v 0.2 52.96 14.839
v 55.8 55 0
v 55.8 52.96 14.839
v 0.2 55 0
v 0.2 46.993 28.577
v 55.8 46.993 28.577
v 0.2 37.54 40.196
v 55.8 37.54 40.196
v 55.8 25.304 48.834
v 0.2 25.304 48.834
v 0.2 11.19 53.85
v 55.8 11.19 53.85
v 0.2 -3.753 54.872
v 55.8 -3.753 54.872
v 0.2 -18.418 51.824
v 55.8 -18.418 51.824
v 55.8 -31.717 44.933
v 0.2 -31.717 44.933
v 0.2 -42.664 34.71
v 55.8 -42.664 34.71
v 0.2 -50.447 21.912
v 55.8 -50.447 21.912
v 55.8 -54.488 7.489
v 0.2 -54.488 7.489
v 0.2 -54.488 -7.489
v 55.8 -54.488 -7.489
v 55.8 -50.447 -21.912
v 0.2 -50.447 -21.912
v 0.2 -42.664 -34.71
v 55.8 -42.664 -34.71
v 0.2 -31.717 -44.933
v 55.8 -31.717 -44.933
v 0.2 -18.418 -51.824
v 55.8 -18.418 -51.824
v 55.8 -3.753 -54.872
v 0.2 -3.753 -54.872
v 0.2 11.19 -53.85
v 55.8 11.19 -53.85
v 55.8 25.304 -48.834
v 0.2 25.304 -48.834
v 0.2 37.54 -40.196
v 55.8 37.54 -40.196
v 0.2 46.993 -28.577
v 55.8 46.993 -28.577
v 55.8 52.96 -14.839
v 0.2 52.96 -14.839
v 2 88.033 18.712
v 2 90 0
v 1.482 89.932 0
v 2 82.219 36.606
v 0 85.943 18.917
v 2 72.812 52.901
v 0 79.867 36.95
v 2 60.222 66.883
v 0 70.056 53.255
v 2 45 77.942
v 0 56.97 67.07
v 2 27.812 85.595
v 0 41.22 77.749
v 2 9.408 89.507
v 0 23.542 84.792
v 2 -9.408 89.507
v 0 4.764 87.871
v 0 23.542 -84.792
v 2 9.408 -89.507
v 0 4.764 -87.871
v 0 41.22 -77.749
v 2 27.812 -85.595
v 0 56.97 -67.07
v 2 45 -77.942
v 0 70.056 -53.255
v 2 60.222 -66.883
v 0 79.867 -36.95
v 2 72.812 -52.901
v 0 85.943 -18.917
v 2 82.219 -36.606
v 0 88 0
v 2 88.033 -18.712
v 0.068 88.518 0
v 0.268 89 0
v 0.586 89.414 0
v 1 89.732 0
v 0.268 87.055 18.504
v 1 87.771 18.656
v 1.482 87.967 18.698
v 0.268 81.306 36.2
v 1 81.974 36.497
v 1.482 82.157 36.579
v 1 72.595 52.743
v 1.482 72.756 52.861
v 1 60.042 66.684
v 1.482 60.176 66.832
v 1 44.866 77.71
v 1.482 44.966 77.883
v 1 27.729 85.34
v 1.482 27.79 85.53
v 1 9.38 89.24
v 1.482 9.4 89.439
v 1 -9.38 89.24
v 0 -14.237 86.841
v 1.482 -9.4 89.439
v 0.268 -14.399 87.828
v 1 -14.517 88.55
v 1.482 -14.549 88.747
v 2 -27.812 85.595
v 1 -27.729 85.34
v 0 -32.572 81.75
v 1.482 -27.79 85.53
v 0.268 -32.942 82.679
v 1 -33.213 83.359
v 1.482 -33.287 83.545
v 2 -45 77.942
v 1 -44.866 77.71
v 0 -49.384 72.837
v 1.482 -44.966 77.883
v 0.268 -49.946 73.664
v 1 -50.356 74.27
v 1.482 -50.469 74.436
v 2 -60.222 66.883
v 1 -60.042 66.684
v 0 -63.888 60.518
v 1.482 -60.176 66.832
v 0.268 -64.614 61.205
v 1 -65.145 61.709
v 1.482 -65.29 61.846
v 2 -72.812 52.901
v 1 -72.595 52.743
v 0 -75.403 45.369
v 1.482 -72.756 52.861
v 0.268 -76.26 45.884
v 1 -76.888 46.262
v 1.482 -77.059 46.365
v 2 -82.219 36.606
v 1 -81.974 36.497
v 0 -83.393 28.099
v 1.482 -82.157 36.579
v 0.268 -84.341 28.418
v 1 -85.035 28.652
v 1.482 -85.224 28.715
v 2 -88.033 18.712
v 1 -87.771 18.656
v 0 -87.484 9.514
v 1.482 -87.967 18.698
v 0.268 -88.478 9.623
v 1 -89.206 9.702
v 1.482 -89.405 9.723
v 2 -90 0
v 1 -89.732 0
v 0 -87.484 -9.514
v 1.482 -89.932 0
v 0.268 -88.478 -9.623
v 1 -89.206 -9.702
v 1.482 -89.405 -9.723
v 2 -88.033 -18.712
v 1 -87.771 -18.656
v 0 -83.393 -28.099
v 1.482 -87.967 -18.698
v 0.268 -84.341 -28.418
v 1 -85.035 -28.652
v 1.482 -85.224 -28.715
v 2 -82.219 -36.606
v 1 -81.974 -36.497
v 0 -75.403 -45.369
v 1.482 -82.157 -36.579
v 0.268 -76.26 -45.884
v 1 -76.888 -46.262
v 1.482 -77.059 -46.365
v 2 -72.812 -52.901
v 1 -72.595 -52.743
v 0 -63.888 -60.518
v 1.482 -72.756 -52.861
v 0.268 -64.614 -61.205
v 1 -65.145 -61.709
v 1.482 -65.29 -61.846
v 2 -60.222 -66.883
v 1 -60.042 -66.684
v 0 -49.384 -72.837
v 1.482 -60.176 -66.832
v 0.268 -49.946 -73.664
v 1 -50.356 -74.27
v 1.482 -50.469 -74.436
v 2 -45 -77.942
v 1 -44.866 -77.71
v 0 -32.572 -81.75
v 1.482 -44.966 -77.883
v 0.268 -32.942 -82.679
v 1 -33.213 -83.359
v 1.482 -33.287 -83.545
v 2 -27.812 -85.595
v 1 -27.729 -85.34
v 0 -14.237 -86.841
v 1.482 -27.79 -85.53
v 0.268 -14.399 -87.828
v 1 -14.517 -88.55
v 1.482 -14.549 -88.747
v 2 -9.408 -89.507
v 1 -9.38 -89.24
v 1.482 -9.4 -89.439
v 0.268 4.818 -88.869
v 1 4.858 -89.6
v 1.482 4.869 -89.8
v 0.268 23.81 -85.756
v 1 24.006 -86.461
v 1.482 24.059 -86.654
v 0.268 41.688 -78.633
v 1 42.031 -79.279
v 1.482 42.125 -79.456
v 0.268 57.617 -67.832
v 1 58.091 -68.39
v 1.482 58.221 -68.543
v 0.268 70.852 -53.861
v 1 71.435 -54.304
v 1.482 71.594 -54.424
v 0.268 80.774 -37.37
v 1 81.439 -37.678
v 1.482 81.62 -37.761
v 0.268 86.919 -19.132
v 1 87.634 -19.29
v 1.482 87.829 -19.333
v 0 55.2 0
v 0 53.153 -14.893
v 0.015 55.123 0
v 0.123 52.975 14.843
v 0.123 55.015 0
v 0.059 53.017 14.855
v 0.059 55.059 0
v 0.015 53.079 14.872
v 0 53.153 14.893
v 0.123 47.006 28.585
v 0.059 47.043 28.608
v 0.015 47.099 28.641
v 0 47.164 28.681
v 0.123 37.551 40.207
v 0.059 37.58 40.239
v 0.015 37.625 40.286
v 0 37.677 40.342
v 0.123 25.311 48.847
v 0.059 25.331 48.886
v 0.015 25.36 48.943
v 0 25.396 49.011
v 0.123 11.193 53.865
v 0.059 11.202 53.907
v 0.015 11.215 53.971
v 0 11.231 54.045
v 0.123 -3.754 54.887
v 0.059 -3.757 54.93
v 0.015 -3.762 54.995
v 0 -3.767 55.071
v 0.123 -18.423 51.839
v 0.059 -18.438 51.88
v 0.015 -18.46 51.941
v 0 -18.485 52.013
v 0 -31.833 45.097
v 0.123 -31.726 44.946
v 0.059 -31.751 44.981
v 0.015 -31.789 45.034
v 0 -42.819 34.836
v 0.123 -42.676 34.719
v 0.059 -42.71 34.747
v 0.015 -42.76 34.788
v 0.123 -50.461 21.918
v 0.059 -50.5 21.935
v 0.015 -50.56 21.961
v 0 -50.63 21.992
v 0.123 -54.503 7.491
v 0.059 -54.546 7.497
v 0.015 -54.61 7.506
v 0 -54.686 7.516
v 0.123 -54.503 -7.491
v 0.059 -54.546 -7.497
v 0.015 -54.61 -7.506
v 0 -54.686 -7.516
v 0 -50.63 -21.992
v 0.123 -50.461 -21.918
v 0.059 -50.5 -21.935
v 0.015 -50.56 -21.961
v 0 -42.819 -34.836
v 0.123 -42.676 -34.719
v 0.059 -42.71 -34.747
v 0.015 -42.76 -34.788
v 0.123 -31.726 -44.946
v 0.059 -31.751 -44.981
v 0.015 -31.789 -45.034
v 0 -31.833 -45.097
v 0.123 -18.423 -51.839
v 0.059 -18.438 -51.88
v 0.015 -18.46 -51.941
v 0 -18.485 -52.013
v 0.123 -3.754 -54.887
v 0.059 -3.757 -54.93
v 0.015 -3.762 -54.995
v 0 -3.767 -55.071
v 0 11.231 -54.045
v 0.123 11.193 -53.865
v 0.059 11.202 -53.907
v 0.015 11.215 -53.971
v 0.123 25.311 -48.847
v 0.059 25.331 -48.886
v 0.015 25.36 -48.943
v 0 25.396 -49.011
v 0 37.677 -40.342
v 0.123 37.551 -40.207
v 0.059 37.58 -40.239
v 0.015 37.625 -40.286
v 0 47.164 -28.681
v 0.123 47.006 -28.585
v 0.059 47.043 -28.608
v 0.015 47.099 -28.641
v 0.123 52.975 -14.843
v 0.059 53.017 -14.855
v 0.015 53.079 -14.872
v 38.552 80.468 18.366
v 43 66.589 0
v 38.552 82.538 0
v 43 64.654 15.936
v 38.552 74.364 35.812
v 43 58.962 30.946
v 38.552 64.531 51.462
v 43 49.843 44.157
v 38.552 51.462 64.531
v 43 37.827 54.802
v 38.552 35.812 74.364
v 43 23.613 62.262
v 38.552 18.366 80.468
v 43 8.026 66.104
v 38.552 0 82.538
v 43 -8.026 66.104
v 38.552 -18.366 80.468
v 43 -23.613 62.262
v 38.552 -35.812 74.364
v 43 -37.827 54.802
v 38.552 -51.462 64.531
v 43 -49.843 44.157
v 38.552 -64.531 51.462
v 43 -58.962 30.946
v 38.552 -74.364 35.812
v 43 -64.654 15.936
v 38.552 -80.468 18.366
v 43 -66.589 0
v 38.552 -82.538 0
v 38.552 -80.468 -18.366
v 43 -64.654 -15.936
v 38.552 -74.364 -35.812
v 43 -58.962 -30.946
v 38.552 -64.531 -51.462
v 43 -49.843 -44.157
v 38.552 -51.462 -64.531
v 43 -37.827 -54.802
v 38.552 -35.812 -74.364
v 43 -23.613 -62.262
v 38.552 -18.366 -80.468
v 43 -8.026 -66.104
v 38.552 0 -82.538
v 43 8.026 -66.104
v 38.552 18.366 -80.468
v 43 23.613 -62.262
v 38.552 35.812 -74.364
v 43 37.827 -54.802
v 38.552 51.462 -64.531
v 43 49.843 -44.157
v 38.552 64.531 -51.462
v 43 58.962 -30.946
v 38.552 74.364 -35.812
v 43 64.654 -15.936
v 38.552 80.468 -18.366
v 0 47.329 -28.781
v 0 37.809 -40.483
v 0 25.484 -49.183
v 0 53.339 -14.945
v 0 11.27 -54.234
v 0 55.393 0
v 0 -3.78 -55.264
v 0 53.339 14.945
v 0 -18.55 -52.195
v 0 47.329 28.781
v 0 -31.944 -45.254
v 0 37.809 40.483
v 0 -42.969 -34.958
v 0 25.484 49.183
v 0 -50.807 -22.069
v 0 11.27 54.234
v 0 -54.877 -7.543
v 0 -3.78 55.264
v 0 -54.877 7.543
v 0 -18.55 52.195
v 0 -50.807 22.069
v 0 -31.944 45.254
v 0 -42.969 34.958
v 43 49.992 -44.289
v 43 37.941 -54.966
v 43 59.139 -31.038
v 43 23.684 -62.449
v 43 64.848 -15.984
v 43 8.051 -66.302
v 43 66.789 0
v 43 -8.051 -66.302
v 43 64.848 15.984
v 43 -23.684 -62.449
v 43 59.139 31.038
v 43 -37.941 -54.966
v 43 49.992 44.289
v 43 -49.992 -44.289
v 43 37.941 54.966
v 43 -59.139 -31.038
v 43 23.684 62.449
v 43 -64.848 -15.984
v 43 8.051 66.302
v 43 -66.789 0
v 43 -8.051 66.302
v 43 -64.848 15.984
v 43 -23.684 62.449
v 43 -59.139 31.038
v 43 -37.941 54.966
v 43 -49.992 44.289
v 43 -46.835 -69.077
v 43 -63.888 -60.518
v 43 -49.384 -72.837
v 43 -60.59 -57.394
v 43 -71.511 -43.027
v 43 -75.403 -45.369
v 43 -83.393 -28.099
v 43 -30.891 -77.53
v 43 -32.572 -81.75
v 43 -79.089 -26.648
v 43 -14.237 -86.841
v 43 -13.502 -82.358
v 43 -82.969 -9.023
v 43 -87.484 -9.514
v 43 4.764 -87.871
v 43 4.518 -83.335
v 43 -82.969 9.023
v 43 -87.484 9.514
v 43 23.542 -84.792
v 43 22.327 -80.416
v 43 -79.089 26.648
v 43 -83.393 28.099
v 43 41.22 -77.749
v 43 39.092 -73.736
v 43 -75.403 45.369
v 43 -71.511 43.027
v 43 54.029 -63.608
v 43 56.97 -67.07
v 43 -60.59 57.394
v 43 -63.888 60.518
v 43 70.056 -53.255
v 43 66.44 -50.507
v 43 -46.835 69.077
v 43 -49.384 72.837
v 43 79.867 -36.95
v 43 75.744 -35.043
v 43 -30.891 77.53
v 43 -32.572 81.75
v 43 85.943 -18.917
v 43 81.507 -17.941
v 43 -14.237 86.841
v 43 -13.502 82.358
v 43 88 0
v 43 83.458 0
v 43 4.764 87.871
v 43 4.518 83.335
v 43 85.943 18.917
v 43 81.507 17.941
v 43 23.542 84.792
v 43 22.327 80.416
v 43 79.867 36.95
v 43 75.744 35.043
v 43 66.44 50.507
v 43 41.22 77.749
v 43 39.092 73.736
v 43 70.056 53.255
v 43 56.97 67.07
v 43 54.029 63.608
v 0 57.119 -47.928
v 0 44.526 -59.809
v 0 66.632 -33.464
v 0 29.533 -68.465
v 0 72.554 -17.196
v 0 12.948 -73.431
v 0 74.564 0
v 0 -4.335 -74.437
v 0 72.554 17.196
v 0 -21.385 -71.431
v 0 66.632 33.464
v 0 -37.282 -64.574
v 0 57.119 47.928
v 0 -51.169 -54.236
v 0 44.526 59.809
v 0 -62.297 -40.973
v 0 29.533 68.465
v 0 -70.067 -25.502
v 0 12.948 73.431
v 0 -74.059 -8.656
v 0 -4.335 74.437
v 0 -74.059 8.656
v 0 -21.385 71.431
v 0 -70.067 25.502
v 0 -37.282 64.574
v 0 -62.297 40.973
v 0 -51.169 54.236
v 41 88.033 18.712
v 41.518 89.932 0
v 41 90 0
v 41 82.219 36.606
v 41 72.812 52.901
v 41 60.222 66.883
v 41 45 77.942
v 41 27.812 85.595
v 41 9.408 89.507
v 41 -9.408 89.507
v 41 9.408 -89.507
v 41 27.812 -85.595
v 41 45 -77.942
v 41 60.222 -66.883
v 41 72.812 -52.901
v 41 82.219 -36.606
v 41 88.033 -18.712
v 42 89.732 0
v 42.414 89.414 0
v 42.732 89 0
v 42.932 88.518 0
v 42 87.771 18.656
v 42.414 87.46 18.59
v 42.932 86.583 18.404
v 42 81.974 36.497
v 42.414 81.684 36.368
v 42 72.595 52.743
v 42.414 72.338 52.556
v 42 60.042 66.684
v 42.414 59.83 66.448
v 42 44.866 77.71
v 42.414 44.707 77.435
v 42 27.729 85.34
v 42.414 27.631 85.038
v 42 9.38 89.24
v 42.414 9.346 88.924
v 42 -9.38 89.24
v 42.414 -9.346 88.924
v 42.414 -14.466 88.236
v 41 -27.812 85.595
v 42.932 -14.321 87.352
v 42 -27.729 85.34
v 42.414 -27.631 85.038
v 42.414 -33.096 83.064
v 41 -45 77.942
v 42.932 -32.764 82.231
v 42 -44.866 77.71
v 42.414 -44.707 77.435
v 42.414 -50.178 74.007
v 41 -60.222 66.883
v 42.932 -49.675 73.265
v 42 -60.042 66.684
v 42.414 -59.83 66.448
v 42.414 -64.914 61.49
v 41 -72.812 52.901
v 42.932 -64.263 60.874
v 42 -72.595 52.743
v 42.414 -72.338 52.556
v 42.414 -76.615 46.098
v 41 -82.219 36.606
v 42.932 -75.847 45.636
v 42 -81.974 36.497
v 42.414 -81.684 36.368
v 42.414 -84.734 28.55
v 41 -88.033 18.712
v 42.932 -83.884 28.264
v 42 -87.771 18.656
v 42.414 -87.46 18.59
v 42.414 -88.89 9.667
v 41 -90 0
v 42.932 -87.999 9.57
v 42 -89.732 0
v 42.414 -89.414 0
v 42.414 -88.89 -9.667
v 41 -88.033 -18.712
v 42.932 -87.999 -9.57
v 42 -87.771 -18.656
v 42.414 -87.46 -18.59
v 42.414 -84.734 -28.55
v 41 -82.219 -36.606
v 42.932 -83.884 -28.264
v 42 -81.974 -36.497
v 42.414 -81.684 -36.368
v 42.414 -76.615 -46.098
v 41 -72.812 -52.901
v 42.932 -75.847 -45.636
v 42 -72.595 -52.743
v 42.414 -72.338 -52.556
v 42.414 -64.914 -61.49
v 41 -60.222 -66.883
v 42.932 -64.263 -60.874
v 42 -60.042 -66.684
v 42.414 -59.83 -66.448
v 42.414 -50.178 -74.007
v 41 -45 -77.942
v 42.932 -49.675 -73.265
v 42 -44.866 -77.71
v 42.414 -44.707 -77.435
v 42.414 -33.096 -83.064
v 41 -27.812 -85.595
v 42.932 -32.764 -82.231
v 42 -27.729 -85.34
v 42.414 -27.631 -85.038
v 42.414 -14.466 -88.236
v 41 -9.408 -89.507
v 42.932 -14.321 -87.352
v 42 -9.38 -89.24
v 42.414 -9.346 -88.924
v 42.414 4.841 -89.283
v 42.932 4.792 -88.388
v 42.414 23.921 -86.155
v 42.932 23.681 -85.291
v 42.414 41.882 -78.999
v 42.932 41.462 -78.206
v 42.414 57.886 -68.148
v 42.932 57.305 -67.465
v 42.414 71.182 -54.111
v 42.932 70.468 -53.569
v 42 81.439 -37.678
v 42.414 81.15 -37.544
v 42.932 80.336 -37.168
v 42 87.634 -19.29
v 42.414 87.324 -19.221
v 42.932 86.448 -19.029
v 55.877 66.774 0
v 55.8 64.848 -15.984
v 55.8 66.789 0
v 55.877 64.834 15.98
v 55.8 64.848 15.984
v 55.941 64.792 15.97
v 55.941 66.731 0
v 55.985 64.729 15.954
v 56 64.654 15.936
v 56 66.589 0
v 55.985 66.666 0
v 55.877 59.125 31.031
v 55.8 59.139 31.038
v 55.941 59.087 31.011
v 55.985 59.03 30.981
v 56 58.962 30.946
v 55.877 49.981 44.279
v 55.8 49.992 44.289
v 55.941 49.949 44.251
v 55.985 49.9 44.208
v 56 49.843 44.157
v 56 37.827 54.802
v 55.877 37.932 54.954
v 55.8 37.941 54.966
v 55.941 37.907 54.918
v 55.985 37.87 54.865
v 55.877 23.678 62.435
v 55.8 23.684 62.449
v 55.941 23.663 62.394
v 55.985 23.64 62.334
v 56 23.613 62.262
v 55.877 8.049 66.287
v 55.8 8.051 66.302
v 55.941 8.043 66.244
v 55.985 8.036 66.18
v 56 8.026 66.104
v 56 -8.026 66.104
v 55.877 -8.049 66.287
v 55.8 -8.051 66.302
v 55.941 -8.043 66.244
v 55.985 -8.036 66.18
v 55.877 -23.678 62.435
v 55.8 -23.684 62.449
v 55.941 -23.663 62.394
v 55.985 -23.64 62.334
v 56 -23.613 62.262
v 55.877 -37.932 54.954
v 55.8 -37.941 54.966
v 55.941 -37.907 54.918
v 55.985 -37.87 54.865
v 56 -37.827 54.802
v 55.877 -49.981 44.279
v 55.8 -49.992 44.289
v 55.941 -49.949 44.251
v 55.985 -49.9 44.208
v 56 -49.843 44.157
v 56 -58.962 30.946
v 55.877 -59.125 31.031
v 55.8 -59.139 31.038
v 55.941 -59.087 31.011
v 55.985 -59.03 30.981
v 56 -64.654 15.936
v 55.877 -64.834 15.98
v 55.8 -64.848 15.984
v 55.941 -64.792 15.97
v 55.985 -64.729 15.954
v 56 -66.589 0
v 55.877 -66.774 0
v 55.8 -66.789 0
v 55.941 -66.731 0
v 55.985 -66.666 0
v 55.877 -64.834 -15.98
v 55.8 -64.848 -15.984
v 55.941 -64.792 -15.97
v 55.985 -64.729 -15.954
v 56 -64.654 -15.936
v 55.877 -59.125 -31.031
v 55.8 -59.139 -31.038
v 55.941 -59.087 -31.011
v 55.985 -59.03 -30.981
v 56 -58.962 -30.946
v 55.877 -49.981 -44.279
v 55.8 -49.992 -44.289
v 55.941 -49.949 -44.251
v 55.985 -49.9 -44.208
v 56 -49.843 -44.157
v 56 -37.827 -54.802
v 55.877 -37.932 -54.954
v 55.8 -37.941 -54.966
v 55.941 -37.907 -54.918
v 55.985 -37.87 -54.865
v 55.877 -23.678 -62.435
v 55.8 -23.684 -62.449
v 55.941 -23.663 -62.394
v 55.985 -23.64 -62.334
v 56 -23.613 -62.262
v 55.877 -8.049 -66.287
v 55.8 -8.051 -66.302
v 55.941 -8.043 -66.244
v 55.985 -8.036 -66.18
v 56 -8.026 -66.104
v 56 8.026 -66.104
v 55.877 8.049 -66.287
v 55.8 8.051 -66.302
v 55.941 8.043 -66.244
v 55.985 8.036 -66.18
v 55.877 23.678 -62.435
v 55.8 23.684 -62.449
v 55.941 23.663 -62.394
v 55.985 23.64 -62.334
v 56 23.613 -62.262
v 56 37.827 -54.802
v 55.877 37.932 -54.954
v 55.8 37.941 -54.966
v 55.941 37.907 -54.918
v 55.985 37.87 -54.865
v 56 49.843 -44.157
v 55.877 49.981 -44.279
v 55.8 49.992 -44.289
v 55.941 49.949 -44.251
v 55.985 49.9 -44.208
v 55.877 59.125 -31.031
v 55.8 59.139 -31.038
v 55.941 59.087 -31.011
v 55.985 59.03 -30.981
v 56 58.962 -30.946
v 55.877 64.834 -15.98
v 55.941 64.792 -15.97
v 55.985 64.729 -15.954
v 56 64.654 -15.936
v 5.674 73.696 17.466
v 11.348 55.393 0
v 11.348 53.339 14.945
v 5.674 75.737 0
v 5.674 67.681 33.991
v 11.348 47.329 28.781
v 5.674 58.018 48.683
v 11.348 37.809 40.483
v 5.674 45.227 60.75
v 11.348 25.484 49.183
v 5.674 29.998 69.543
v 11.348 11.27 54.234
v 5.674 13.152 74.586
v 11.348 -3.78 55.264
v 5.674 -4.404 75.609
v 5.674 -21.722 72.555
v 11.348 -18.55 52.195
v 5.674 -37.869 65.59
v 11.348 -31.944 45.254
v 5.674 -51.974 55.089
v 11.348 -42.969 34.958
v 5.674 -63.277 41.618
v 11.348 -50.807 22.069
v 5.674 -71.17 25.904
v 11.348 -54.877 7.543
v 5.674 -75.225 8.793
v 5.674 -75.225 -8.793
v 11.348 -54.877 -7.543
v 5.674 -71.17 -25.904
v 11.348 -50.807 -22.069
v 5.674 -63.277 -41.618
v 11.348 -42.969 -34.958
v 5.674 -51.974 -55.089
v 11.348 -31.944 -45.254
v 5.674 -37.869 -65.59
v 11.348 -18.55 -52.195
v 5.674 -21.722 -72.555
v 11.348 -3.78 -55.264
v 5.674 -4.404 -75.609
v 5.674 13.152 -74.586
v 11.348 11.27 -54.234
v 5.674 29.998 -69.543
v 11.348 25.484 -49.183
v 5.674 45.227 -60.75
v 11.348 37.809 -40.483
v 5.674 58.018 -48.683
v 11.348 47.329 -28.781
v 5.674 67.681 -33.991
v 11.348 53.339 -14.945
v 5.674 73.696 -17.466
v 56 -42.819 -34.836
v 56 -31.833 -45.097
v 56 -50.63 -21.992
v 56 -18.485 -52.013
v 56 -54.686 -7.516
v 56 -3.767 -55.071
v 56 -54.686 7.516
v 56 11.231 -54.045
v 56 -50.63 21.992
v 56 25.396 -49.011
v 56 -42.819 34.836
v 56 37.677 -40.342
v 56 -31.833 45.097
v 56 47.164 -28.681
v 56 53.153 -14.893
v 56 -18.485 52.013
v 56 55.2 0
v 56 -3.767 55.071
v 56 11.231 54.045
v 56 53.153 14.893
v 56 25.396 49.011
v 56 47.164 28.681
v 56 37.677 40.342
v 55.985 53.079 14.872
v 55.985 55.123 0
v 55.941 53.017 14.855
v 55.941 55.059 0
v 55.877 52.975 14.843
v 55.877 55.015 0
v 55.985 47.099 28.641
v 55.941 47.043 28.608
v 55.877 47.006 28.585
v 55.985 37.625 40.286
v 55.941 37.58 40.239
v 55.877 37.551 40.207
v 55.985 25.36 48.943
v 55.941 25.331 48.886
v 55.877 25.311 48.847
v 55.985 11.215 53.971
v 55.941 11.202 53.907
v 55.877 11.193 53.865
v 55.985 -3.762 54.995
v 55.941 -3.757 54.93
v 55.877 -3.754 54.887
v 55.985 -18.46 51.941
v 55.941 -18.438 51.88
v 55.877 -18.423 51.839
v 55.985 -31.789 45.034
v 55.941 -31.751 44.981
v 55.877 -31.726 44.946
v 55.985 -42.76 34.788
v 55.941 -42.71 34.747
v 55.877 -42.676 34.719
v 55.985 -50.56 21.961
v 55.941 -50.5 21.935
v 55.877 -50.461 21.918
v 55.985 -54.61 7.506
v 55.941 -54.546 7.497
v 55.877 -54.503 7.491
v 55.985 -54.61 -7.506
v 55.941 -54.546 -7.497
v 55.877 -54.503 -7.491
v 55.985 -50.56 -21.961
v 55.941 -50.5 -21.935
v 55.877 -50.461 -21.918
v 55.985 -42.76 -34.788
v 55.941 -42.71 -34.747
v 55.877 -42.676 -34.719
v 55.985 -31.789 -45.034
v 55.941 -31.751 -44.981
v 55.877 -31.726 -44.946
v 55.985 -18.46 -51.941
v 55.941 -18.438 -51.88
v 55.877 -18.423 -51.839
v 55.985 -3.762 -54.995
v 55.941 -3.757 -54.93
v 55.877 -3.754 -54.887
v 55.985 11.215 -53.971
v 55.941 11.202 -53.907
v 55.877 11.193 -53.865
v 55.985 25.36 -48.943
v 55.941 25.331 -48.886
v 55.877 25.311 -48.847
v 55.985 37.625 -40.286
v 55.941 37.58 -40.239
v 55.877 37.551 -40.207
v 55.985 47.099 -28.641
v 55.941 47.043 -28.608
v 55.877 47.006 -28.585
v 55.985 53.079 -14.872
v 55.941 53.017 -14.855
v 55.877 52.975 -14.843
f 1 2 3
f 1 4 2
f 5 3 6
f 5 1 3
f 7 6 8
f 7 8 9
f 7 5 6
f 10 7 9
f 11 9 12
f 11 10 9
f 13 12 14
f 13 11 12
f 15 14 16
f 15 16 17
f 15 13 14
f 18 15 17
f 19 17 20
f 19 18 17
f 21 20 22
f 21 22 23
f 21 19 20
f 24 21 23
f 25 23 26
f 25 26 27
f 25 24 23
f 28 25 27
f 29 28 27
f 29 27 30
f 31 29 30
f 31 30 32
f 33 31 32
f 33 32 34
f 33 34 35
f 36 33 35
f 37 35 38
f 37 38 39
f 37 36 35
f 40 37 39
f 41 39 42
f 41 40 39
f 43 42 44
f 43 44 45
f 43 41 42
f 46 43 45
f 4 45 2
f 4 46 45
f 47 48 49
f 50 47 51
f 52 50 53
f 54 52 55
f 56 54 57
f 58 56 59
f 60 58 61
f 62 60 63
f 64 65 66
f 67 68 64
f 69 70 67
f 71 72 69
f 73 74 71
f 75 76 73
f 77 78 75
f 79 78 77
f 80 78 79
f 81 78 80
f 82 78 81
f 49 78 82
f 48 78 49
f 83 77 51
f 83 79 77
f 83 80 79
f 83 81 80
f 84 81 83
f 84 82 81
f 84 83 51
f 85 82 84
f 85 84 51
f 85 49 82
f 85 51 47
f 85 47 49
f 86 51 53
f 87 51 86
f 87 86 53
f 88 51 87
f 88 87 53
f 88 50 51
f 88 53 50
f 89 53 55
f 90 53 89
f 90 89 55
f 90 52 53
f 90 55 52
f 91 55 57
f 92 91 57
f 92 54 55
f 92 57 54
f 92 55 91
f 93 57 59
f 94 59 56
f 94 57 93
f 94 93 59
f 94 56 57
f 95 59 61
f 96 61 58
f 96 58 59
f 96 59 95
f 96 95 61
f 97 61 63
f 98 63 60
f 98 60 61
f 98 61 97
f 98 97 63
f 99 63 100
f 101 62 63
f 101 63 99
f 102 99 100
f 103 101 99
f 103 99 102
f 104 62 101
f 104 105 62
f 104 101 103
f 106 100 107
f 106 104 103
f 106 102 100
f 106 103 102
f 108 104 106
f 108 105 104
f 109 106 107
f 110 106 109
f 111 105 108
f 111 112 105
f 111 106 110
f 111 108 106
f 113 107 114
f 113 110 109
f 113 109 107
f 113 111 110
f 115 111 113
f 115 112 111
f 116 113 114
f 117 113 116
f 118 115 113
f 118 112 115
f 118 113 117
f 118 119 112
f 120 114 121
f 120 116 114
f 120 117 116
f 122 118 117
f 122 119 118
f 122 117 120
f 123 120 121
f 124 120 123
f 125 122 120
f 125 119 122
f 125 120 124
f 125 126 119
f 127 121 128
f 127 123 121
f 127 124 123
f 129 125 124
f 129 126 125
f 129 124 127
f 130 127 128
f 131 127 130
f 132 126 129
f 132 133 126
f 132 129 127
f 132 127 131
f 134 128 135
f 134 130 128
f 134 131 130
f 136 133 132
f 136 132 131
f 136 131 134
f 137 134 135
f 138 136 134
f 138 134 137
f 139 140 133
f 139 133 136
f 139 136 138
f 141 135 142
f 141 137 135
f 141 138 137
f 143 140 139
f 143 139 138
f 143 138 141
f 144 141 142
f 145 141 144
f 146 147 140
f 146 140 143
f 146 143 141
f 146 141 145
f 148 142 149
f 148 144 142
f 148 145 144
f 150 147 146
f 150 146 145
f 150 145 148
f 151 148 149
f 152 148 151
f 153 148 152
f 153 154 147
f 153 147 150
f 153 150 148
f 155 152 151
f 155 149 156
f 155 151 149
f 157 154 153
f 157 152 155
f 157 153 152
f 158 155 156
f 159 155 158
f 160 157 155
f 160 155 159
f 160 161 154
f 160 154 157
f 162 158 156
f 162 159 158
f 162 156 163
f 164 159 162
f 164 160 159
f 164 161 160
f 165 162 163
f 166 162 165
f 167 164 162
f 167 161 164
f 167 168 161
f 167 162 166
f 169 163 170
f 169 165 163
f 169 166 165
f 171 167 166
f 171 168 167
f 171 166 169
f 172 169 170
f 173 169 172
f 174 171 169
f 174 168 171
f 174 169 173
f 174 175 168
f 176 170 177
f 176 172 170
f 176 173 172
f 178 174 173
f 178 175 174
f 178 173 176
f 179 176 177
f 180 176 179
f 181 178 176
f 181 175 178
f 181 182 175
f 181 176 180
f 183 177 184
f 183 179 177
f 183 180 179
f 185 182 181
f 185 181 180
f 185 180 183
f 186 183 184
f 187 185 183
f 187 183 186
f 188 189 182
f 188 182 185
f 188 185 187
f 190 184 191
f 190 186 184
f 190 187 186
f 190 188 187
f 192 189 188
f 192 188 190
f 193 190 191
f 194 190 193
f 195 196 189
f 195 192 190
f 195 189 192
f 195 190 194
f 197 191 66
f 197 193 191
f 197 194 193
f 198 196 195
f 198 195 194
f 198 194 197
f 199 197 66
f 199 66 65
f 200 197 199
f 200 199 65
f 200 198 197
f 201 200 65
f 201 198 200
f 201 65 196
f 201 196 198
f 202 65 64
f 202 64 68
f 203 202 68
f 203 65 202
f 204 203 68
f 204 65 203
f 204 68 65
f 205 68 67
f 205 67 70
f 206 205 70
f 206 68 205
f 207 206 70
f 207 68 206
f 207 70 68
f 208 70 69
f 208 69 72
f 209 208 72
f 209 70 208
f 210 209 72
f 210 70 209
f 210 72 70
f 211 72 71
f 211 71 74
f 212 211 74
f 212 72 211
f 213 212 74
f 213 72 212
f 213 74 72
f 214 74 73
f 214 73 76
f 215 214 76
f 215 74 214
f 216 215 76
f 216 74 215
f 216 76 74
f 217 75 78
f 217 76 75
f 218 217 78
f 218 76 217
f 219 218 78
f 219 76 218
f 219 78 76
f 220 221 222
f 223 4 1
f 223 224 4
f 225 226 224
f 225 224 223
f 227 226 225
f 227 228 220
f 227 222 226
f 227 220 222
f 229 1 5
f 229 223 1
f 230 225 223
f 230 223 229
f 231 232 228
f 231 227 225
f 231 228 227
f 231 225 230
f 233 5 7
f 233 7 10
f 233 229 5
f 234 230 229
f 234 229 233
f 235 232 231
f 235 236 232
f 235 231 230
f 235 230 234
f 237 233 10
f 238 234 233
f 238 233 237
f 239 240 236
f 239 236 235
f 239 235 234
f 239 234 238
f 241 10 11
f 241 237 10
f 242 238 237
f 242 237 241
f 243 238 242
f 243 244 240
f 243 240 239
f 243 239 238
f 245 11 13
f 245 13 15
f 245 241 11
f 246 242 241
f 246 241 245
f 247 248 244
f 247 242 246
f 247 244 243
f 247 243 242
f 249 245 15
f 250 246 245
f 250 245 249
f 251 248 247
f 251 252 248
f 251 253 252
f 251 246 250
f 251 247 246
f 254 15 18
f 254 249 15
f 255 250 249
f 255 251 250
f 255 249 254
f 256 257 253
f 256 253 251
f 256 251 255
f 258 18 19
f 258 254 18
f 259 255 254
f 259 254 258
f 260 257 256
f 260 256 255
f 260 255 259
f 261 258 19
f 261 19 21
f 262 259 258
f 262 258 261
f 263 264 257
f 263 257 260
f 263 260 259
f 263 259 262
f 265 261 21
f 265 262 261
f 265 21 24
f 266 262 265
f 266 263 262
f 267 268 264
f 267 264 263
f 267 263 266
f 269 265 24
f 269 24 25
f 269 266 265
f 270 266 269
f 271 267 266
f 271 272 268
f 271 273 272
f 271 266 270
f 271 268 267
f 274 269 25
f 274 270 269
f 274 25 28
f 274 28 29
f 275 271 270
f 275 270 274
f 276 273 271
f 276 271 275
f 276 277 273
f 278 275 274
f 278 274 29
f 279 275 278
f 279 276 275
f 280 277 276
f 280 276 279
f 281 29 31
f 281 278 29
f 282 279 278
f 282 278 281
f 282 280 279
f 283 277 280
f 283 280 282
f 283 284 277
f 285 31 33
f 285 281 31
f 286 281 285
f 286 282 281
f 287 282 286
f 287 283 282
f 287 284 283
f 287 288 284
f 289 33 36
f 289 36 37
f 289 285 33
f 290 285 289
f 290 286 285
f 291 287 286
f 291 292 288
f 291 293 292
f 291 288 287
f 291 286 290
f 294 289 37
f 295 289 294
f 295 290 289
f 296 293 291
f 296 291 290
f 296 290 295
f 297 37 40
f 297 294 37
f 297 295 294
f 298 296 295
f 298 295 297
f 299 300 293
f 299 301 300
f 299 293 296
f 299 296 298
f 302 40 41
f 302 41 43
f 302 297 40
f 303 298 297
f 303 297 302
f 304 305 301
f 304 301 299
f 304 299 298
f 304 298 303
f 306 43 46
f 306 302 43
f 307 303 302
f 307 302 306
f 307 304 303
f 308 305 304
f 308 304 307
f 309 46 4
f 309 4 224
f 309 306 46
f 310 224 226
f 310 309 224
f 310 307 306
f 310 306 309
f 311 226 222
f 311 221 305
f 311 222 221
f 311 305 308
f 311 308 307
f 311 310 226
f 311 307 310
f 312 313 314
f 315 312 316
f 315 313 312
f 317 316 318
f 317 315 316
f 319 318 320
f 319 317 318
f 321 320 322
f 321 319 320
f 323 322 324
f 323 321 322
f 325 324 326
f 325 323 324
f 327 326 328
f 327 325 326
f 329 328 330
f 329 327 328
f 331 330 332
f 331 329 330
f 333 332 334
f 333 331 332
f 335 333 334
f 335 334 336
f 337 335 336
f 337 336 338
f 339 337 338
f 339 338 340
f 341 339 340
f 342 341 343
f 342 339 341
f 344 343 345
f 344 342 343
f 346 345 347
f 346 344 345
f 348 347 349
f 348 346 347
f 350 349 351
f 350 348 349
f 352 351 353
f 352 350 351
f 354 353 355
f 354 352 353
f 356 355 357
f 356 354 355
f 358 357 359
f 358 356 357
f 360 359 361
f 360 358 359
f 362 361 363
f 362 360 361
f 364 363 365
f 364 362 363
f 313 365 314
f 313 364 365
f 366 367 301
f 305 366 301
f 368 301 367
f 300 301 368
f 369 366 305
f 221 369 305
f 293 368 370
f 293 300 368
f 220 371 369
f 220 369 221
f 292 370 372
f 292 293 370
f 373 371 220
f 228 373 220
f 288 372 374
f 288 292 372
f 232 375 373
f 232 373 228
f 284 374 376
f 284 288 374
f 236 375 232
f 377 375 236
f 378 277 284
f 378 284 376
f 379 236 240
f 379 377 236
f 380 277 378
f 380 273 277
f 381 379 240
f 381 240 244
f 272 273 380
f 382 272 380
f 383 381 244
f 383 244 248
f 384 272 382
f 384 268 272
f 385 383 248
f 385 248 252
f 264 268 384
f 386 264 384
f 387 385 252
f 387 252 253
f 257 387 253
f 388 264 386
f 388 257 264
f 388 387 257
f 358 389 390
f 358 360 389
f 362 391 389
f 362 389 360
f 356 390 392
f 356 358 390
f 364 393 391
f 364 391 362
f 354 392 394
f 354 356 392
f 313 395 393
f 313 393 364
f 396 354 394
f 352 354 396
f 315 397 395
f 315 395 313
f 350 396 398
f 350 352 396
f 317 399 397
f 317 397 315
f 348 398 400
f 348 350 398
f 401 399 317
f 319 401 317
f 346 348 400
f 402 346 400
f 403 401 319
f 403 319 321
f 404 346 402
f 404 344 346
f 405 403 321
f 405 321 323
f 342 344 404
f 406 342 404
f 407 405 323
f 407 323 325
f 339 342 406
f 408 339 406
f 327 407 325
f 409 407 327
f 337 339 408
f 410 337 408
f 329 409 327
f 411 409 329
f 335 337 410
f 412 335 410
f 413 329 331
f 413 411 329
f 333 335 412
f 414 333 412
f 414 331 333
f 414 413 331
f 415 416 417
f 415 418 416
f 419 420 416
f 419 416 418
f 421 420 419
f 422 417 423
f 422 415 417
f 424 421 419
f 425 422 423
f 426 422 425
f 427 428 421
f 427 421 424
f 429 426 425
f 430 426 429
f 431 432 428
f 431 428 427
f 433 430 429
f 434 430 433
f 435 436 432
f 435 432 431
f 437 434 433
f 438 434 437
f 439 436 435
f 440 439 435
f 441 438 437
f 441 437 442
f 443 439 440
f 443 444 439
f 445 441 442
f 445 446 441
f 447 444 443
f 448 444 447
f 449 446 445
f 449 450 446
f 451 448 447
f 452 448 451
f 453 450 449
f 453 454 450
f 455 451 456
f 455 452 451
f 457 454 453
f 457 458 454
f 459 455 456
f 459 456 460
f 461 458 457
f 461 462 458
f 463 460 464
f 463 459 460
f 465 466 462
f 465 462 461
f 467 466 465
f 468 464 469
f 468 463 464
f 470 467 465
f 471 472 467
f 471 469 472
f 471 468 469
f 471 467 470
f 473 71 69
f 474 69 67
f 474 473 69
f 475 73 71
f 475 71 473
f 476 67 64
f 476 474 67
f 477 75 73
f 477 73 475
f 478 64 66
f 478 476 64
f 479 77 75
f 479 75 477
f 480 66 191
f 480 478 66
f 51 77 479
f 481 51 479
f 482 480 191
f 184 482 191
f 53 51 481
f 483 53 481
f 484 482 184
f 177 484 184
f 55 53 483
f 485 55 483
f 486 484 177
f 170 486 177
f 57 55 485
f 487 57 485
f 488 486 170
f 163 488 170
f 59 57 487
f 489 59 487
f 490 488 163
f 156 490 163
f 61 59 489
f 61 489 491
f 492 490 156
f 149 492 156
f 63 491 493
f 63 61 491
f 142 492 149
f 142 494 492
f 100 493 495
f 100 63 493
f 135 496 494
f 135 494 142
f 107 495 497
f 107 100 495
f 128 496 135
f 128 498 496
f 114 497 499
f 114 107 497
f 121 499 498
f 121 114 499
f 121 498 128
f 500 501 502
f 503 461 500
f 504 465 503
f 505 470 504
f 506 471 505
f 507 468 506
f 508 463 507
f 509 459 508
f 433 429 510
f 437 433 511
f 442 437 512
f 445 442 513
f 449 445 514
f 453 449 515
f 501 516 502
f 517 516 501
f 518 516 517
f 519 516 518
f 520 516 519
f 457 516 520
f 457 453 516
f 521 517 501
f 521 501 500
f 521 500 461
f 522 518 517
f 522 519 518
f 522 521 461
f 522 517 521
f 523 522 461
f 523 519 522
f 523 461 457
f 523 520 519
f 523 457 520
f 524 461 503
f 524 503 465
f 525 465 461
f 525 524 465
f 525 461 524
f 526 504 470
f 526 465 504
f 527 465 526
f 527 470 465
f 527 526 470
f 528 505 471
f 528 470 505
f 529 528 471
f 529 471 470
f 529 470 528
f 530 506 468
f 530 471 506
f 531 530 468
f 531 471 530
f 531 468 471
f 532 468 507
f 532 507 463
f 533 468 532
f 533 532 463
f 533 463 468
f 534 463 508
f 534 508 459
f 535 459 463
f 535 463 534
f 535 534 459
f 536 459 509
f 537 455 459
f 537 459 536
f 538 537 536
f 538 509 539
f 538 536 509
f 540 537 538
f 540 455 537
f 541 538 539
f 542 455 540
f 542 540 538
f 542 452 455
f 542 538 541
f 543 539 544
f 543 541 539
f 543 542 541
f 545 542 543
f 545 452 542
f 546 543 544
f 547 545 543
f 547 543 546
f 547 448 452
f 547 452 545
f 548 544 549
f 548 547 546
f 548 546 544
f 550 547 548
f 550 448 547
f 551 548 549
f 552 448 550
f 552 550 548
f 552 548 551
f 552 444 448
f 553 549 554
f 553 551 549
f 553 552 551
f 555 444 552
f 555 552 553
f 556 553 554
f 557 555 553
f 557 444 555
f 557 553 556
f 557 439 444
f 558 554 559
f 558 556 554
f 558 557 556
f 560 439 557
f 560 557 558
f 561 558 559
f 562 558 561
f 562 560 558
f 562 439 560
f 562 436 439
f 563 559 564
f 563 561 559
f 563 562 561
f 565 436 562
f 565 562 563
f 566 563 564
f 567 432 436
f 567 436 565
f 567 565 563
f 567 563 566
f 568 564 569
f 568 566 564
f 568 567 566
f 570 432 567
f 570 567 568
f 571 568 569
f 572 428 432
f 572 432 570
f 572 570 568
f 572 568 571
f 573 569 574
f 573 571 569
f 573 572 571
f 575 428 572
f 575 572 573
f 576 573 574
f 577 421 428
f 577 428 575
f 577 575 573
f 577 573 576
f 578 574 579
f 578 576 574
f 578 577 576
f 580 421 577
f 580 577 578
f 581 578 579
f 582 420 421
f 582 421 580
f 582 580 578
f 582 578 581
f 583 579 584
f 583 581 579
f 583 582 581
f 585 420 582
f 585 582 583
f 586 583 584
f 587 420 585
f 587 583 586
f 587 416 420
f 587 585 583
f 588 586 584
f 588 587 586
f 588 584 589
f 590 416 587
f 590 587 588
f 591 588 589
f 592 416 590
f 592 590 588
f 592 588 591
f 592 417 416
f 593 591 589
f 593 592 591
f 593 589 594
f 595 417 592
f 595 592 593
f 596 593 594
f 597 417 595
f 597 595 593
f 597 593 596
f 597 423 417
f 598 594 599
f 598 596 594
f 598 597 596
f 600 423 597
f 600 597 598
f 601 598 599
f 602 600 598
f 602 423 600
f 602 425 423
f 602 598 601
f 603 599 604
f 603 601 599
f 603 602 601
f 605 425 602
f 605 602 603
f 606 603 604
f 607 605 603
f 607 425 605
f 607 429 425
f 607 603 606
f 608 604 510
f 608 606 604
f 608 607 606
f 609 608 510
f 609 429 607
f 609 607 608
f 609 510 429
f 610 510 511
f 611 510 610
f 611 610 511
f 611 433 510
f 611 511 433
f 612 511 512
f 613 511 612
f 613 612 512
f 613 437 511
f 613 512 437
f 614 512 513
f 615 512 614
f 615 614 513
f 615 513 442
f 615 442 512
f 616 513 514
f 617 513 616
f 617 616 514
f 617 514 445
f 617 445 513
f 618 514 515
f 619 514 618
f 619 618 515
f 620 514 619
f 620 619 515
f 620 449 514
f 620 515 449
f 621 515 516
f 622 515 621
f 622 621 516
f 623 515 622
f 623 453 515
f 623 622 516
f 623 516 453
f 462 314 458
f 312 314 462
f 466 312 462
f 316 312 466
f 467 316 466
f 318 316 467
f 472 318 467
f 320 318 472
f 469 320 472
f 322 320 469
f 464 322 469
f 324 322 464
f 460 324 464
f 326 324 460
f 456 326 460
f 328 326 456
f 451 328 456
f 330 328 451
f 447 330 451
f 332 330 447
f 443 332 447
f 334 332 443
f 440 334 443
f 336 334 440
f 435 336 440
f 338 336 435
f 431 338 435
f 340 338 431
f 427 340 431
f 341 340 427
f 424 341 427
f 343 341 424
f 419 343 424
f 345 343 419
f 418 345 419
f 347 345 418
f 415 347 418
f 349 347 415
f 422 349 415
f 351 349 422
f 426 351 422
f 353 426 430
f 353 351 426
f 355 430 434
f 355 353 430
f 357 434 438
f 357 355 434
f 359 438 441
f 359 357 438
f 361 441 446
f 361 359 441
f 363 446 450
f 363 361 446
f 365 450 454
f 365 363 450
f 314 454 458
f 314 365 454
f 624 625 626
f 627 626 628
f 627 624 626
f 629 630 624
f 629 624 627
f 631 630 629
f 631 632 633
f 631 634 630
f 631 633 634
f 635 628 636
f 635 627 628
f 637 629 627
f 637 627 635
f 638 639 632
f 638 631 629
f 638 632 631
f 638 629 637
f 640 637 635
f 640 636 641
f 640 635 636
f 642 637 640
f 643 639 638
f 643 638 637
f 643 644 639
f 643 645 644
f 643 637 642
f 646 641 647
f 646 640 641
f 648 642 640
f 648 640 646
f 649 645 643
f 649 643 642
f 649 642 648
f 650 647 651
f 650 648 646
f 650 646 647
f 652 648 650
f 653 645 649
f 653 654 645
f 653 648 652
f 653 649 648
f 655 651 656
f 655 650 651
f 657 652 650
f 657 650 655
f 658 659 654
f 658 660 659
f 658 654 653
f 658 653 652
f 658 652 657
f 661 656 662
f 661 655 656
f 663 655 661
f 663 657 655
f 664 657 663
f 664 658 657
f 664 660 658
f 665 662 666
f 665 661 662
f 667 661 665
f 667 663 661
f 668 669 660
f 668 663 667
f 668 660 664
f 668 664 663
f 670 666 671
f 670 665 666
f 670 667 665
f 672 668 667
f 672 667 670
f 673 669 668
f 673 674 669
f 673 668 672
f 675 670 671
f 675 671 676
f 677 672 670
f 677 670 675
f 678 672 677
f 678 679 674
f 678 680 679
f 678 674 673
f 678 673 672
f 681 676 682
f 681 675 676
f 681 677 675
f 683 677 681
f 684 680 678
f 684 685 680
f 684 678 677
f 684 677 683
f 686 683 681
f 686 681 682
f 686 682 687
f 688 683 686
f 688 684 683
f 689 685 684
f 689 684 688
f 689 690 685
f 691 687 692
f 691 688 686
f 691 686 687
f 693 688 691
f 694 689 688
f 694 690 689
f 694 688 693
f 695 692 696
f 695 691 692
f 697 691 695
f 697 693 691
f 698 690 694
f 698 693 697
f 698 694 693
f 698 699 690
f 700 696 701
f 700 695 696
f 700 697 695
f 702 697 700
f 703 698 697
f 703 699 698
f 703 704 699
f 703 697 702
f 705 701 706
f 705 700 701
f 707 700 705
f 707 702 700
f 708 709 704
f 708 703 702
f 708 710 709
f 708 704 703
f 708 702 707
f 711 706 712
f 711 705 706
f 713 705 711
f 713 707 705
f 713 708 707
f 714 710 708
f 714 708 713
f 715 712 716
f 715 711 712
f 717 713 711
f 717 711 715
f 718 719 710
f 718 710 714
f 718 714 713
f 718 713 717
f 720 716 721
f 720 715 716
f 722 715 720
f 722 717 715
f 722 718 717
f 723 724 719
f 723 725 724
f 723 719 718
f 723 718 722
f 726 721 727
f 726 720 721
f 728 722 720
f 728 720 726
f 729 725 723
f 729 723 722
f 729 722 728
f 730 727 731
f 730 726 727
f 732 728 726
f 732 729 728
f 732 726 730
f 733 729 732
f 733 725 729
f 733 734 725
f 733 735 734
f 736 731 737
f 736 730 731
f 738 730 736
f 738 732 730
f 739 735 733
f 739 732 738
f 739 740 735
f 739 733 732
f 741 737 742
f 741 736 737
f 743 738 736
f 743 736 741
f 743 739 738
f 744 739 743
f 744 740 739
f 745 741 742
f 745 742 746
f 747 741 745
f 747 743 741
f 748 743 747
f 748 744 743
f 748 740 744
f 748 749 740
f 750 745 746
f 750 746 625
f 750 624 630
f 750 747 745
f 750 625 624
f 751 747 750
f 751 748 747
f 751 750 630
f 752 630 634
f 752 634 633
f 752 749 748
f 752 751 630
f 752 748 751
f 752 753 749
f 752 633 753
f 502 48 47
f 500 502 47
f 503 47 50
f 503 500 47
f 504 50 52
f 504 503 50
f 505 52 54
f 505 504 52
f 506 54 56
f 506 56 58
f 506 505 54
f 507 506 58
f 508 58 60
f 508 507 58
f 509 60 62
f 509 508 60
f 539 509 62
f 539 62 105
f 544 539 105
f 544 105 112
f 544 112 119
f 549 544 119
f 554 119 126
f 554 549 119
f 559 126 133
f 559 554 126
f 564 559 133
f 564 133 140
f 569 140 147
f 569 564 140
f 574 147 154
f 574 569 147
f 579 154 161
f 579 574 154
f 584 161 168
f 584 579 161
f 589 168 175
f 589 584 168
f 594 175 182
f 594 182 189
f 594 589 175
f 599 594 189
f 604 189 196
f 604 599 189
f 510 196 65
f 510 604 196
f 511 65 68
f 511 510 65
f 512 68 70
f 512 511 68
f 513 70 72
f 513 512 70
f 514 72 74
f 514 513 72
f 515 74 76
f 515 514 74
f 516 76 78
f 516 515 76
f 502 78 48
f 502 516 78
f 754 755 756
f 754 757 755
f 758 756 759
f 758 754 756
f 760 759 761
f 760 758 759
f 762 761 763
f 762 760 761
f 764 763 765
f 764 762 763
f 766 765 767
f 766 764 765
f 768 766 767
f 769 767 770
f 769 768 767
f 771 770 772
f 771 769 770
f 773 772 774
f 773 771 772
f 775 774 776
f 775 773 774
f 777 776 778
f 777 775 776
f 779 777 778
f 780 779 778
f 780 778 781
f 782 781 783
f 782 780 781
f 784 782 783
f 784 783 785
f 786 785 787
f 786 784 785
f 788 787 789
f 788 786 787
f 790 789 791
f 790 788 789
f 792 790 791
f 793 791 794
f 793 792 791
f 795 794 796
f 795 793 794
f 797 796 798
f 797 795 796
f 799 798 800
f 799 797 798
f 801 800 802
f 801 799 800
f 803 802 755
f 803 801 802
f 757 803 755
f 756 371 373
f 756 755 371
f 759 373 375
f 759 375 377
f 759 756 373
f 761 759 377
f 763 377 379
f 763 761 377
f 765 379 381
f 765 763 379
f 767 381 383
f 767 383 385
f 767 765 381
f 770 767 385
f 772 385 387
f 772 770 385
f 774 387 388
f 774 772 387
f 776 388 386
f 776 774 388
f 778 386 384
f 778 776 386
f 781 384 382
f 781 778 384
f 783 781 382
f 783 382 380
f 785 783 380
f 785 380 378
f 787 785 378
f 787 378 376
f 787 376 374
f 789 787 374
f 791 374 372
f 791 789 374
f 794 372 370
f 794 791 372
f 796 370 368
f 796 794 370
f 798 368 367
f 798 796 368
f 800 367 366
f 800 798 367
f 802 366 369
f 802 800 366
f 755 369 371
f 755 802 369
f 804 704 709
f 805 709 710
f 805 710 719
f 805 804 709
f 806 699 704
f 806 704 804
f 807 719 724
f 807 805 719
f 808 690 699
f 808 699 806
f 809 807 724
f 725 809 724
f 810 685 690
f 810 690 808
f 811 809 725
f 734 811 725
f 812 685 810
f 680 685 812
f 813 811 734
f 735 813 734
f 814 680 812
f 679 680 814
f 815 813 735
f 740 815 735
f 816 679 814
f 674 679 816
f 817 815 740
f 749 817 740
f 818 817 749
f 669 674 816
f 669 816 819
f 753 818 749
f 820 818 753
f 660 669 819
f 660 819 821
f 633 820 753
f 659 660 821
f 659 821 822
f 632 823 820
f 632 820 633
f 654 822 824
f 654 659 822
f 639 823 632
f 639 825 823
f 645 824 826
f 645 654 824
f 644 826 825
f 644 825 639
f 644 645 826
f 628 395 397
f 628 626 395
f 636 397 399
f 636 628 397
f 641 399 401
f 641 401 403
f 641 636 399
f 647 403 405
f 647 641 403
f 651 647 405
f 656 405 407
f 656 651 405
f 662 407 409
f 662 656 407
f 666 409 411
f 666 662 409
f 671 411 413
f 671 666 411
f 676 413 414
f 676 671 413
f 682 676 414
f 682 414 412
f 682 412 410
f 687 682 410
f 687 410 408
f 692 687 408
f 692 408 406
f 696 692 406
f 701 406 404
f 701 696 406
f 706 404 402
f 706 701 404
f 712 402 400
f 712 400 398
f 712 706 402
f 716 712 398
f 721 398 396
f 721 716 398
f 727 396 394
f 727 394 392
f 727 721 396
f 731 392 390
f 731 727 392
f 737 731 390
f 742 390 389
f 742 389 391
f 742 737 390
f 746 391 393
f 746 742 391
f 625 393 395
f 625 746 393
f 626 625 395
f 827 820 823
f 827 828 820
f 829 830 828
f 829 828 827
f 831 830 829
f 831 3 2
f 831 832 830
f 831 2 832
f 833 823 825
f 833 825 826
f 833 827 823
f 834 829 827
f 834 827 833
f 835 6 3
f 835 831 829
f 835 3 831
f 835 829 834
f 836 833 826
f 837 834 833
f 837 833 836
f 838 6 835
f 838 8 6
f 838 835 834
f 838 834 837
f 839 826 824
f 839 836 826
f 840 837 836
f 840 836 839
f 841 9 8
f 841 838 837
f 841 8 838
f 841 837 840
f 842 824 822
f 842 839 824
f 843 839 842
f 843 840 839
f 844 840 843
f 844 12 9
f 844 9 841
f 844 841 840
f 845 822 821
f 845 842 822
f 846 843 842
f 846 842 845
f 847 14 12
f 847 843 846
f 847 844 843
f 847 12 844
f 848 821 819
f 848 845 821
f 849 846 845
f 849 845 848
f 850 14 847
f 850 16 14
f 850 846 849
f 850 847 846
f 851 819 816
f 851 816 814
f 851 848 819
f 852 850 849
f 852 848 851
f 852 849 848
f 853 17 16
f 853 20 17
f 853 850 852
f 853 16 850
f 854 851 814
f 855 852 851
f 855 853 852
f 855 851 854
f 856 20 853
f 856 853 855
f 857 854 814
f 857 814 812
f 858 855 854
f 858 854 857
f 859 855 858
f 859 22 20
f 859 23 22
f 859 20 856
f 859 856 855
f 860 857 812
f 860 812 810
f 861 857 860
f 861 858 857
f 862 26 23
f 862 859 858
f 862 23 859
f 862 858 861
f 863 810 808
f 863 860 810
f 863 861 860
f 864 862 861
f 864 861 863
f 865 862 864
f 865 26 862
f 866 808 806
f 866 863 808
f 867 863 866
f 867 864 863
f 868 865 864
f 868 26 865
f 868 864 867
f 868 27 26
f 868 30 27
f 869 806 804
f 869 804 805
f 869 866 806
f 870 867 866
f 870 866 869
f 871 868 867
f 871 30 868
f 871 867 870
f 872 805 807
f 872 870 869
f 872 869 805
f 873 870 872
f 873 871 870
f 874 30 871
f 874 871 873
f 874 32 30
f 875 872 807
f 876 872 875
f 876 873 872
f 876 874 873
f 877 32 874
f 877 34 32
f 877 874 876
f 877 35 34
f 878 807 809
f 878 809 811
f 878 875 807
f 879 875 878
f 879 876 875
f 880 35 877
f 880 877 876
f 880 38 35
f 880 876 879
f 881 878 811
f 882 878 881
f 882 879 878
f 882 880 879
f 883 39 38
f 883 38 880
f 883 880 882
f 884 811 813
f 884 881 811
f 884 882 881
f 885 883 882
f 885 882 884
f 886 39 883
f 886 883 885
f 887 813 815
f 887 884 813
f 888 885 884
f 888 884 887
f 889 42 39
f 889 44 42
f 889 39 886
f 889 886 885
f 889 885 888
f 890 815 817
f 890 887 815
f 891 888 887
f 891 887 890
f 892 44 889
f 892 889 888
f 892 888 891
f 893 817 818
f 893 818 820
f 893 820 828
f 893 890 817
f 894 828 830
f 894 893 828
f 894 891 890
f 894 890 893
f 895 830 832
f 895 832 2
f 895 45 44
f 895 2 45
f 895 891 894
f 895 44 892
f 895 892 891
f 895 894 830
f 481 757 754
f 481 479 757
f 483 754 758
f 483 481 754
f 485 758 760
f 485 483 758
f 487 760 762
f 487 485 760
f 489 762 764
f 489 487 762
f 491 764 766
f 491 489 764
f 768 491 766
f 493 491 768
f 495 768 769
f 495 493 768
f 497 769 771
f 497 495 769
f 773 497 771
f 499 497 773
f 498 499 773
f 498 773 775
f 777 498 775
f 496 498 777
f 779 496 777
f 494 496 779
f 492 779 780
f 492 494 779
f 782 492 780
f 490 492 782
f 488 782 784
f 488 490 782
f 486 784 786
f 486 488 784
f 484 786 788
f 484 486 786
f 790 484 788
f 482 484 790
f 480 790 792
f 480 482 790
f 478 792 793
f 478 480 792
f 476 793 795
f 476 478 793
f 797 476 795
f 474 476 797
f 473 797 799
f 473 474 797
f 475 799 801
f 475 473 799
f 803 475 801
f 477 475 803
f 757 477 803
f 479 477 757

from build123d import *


with BuildPart() as part:
    # Эскиз1 → Повернуть1 (revolve)
    with BuildSketch(Plane.XY):
        with BuildLine():
            Line((5.673835343, 75.737111548), (0, 74.5635))
            Line((0, 74.5635), (0, 88))
            ThreePointArc((0, 88), (0.585786438, 89.414213562), (2, 90))
            Line((2, 90), (41, 90))
            ThreePointArc((41, 90), (42.414213562, 89.414213562), (43, 88))
            Line((43, 88), (43, 83.457888633))
            Line((43, 83.457888633), (38.55204573, 82.537845984))
            Line((38.55204573, 82.537845984), (43, 66.589154016))
            Line((43, 66.589154016), (43, 66.789154016))
            Line((43, 66.789154016), (55.8, 66.789154016))
            ThreePointArc((55.8, 66.789154016), (55.941421356, 66.730575372), (56, 66.589154016))
            Line((56, 66.589154016), (56, 55.2))
            ThreePointArc((56, 55.2), (55.941421356, 55.058578644), (55.8, 55))
            Line((55.8, 55), (0.2, 55))
            ThreePointArc((0.2, 55), (0.058578644, 55.058578644), (0, 55.2))
            Line((0, 55.2), (0, 55.392870878))
            Line((0, 55.392870878), (11.347670687, 55.392870878))
            Line((11.347670687, 55.392870878), (5.673835343, 75.737111548))
        make_face()
    revolve(axis=Axis((-882.527700014, 0, 0), (1, 0, 0)))


solid = part.part
